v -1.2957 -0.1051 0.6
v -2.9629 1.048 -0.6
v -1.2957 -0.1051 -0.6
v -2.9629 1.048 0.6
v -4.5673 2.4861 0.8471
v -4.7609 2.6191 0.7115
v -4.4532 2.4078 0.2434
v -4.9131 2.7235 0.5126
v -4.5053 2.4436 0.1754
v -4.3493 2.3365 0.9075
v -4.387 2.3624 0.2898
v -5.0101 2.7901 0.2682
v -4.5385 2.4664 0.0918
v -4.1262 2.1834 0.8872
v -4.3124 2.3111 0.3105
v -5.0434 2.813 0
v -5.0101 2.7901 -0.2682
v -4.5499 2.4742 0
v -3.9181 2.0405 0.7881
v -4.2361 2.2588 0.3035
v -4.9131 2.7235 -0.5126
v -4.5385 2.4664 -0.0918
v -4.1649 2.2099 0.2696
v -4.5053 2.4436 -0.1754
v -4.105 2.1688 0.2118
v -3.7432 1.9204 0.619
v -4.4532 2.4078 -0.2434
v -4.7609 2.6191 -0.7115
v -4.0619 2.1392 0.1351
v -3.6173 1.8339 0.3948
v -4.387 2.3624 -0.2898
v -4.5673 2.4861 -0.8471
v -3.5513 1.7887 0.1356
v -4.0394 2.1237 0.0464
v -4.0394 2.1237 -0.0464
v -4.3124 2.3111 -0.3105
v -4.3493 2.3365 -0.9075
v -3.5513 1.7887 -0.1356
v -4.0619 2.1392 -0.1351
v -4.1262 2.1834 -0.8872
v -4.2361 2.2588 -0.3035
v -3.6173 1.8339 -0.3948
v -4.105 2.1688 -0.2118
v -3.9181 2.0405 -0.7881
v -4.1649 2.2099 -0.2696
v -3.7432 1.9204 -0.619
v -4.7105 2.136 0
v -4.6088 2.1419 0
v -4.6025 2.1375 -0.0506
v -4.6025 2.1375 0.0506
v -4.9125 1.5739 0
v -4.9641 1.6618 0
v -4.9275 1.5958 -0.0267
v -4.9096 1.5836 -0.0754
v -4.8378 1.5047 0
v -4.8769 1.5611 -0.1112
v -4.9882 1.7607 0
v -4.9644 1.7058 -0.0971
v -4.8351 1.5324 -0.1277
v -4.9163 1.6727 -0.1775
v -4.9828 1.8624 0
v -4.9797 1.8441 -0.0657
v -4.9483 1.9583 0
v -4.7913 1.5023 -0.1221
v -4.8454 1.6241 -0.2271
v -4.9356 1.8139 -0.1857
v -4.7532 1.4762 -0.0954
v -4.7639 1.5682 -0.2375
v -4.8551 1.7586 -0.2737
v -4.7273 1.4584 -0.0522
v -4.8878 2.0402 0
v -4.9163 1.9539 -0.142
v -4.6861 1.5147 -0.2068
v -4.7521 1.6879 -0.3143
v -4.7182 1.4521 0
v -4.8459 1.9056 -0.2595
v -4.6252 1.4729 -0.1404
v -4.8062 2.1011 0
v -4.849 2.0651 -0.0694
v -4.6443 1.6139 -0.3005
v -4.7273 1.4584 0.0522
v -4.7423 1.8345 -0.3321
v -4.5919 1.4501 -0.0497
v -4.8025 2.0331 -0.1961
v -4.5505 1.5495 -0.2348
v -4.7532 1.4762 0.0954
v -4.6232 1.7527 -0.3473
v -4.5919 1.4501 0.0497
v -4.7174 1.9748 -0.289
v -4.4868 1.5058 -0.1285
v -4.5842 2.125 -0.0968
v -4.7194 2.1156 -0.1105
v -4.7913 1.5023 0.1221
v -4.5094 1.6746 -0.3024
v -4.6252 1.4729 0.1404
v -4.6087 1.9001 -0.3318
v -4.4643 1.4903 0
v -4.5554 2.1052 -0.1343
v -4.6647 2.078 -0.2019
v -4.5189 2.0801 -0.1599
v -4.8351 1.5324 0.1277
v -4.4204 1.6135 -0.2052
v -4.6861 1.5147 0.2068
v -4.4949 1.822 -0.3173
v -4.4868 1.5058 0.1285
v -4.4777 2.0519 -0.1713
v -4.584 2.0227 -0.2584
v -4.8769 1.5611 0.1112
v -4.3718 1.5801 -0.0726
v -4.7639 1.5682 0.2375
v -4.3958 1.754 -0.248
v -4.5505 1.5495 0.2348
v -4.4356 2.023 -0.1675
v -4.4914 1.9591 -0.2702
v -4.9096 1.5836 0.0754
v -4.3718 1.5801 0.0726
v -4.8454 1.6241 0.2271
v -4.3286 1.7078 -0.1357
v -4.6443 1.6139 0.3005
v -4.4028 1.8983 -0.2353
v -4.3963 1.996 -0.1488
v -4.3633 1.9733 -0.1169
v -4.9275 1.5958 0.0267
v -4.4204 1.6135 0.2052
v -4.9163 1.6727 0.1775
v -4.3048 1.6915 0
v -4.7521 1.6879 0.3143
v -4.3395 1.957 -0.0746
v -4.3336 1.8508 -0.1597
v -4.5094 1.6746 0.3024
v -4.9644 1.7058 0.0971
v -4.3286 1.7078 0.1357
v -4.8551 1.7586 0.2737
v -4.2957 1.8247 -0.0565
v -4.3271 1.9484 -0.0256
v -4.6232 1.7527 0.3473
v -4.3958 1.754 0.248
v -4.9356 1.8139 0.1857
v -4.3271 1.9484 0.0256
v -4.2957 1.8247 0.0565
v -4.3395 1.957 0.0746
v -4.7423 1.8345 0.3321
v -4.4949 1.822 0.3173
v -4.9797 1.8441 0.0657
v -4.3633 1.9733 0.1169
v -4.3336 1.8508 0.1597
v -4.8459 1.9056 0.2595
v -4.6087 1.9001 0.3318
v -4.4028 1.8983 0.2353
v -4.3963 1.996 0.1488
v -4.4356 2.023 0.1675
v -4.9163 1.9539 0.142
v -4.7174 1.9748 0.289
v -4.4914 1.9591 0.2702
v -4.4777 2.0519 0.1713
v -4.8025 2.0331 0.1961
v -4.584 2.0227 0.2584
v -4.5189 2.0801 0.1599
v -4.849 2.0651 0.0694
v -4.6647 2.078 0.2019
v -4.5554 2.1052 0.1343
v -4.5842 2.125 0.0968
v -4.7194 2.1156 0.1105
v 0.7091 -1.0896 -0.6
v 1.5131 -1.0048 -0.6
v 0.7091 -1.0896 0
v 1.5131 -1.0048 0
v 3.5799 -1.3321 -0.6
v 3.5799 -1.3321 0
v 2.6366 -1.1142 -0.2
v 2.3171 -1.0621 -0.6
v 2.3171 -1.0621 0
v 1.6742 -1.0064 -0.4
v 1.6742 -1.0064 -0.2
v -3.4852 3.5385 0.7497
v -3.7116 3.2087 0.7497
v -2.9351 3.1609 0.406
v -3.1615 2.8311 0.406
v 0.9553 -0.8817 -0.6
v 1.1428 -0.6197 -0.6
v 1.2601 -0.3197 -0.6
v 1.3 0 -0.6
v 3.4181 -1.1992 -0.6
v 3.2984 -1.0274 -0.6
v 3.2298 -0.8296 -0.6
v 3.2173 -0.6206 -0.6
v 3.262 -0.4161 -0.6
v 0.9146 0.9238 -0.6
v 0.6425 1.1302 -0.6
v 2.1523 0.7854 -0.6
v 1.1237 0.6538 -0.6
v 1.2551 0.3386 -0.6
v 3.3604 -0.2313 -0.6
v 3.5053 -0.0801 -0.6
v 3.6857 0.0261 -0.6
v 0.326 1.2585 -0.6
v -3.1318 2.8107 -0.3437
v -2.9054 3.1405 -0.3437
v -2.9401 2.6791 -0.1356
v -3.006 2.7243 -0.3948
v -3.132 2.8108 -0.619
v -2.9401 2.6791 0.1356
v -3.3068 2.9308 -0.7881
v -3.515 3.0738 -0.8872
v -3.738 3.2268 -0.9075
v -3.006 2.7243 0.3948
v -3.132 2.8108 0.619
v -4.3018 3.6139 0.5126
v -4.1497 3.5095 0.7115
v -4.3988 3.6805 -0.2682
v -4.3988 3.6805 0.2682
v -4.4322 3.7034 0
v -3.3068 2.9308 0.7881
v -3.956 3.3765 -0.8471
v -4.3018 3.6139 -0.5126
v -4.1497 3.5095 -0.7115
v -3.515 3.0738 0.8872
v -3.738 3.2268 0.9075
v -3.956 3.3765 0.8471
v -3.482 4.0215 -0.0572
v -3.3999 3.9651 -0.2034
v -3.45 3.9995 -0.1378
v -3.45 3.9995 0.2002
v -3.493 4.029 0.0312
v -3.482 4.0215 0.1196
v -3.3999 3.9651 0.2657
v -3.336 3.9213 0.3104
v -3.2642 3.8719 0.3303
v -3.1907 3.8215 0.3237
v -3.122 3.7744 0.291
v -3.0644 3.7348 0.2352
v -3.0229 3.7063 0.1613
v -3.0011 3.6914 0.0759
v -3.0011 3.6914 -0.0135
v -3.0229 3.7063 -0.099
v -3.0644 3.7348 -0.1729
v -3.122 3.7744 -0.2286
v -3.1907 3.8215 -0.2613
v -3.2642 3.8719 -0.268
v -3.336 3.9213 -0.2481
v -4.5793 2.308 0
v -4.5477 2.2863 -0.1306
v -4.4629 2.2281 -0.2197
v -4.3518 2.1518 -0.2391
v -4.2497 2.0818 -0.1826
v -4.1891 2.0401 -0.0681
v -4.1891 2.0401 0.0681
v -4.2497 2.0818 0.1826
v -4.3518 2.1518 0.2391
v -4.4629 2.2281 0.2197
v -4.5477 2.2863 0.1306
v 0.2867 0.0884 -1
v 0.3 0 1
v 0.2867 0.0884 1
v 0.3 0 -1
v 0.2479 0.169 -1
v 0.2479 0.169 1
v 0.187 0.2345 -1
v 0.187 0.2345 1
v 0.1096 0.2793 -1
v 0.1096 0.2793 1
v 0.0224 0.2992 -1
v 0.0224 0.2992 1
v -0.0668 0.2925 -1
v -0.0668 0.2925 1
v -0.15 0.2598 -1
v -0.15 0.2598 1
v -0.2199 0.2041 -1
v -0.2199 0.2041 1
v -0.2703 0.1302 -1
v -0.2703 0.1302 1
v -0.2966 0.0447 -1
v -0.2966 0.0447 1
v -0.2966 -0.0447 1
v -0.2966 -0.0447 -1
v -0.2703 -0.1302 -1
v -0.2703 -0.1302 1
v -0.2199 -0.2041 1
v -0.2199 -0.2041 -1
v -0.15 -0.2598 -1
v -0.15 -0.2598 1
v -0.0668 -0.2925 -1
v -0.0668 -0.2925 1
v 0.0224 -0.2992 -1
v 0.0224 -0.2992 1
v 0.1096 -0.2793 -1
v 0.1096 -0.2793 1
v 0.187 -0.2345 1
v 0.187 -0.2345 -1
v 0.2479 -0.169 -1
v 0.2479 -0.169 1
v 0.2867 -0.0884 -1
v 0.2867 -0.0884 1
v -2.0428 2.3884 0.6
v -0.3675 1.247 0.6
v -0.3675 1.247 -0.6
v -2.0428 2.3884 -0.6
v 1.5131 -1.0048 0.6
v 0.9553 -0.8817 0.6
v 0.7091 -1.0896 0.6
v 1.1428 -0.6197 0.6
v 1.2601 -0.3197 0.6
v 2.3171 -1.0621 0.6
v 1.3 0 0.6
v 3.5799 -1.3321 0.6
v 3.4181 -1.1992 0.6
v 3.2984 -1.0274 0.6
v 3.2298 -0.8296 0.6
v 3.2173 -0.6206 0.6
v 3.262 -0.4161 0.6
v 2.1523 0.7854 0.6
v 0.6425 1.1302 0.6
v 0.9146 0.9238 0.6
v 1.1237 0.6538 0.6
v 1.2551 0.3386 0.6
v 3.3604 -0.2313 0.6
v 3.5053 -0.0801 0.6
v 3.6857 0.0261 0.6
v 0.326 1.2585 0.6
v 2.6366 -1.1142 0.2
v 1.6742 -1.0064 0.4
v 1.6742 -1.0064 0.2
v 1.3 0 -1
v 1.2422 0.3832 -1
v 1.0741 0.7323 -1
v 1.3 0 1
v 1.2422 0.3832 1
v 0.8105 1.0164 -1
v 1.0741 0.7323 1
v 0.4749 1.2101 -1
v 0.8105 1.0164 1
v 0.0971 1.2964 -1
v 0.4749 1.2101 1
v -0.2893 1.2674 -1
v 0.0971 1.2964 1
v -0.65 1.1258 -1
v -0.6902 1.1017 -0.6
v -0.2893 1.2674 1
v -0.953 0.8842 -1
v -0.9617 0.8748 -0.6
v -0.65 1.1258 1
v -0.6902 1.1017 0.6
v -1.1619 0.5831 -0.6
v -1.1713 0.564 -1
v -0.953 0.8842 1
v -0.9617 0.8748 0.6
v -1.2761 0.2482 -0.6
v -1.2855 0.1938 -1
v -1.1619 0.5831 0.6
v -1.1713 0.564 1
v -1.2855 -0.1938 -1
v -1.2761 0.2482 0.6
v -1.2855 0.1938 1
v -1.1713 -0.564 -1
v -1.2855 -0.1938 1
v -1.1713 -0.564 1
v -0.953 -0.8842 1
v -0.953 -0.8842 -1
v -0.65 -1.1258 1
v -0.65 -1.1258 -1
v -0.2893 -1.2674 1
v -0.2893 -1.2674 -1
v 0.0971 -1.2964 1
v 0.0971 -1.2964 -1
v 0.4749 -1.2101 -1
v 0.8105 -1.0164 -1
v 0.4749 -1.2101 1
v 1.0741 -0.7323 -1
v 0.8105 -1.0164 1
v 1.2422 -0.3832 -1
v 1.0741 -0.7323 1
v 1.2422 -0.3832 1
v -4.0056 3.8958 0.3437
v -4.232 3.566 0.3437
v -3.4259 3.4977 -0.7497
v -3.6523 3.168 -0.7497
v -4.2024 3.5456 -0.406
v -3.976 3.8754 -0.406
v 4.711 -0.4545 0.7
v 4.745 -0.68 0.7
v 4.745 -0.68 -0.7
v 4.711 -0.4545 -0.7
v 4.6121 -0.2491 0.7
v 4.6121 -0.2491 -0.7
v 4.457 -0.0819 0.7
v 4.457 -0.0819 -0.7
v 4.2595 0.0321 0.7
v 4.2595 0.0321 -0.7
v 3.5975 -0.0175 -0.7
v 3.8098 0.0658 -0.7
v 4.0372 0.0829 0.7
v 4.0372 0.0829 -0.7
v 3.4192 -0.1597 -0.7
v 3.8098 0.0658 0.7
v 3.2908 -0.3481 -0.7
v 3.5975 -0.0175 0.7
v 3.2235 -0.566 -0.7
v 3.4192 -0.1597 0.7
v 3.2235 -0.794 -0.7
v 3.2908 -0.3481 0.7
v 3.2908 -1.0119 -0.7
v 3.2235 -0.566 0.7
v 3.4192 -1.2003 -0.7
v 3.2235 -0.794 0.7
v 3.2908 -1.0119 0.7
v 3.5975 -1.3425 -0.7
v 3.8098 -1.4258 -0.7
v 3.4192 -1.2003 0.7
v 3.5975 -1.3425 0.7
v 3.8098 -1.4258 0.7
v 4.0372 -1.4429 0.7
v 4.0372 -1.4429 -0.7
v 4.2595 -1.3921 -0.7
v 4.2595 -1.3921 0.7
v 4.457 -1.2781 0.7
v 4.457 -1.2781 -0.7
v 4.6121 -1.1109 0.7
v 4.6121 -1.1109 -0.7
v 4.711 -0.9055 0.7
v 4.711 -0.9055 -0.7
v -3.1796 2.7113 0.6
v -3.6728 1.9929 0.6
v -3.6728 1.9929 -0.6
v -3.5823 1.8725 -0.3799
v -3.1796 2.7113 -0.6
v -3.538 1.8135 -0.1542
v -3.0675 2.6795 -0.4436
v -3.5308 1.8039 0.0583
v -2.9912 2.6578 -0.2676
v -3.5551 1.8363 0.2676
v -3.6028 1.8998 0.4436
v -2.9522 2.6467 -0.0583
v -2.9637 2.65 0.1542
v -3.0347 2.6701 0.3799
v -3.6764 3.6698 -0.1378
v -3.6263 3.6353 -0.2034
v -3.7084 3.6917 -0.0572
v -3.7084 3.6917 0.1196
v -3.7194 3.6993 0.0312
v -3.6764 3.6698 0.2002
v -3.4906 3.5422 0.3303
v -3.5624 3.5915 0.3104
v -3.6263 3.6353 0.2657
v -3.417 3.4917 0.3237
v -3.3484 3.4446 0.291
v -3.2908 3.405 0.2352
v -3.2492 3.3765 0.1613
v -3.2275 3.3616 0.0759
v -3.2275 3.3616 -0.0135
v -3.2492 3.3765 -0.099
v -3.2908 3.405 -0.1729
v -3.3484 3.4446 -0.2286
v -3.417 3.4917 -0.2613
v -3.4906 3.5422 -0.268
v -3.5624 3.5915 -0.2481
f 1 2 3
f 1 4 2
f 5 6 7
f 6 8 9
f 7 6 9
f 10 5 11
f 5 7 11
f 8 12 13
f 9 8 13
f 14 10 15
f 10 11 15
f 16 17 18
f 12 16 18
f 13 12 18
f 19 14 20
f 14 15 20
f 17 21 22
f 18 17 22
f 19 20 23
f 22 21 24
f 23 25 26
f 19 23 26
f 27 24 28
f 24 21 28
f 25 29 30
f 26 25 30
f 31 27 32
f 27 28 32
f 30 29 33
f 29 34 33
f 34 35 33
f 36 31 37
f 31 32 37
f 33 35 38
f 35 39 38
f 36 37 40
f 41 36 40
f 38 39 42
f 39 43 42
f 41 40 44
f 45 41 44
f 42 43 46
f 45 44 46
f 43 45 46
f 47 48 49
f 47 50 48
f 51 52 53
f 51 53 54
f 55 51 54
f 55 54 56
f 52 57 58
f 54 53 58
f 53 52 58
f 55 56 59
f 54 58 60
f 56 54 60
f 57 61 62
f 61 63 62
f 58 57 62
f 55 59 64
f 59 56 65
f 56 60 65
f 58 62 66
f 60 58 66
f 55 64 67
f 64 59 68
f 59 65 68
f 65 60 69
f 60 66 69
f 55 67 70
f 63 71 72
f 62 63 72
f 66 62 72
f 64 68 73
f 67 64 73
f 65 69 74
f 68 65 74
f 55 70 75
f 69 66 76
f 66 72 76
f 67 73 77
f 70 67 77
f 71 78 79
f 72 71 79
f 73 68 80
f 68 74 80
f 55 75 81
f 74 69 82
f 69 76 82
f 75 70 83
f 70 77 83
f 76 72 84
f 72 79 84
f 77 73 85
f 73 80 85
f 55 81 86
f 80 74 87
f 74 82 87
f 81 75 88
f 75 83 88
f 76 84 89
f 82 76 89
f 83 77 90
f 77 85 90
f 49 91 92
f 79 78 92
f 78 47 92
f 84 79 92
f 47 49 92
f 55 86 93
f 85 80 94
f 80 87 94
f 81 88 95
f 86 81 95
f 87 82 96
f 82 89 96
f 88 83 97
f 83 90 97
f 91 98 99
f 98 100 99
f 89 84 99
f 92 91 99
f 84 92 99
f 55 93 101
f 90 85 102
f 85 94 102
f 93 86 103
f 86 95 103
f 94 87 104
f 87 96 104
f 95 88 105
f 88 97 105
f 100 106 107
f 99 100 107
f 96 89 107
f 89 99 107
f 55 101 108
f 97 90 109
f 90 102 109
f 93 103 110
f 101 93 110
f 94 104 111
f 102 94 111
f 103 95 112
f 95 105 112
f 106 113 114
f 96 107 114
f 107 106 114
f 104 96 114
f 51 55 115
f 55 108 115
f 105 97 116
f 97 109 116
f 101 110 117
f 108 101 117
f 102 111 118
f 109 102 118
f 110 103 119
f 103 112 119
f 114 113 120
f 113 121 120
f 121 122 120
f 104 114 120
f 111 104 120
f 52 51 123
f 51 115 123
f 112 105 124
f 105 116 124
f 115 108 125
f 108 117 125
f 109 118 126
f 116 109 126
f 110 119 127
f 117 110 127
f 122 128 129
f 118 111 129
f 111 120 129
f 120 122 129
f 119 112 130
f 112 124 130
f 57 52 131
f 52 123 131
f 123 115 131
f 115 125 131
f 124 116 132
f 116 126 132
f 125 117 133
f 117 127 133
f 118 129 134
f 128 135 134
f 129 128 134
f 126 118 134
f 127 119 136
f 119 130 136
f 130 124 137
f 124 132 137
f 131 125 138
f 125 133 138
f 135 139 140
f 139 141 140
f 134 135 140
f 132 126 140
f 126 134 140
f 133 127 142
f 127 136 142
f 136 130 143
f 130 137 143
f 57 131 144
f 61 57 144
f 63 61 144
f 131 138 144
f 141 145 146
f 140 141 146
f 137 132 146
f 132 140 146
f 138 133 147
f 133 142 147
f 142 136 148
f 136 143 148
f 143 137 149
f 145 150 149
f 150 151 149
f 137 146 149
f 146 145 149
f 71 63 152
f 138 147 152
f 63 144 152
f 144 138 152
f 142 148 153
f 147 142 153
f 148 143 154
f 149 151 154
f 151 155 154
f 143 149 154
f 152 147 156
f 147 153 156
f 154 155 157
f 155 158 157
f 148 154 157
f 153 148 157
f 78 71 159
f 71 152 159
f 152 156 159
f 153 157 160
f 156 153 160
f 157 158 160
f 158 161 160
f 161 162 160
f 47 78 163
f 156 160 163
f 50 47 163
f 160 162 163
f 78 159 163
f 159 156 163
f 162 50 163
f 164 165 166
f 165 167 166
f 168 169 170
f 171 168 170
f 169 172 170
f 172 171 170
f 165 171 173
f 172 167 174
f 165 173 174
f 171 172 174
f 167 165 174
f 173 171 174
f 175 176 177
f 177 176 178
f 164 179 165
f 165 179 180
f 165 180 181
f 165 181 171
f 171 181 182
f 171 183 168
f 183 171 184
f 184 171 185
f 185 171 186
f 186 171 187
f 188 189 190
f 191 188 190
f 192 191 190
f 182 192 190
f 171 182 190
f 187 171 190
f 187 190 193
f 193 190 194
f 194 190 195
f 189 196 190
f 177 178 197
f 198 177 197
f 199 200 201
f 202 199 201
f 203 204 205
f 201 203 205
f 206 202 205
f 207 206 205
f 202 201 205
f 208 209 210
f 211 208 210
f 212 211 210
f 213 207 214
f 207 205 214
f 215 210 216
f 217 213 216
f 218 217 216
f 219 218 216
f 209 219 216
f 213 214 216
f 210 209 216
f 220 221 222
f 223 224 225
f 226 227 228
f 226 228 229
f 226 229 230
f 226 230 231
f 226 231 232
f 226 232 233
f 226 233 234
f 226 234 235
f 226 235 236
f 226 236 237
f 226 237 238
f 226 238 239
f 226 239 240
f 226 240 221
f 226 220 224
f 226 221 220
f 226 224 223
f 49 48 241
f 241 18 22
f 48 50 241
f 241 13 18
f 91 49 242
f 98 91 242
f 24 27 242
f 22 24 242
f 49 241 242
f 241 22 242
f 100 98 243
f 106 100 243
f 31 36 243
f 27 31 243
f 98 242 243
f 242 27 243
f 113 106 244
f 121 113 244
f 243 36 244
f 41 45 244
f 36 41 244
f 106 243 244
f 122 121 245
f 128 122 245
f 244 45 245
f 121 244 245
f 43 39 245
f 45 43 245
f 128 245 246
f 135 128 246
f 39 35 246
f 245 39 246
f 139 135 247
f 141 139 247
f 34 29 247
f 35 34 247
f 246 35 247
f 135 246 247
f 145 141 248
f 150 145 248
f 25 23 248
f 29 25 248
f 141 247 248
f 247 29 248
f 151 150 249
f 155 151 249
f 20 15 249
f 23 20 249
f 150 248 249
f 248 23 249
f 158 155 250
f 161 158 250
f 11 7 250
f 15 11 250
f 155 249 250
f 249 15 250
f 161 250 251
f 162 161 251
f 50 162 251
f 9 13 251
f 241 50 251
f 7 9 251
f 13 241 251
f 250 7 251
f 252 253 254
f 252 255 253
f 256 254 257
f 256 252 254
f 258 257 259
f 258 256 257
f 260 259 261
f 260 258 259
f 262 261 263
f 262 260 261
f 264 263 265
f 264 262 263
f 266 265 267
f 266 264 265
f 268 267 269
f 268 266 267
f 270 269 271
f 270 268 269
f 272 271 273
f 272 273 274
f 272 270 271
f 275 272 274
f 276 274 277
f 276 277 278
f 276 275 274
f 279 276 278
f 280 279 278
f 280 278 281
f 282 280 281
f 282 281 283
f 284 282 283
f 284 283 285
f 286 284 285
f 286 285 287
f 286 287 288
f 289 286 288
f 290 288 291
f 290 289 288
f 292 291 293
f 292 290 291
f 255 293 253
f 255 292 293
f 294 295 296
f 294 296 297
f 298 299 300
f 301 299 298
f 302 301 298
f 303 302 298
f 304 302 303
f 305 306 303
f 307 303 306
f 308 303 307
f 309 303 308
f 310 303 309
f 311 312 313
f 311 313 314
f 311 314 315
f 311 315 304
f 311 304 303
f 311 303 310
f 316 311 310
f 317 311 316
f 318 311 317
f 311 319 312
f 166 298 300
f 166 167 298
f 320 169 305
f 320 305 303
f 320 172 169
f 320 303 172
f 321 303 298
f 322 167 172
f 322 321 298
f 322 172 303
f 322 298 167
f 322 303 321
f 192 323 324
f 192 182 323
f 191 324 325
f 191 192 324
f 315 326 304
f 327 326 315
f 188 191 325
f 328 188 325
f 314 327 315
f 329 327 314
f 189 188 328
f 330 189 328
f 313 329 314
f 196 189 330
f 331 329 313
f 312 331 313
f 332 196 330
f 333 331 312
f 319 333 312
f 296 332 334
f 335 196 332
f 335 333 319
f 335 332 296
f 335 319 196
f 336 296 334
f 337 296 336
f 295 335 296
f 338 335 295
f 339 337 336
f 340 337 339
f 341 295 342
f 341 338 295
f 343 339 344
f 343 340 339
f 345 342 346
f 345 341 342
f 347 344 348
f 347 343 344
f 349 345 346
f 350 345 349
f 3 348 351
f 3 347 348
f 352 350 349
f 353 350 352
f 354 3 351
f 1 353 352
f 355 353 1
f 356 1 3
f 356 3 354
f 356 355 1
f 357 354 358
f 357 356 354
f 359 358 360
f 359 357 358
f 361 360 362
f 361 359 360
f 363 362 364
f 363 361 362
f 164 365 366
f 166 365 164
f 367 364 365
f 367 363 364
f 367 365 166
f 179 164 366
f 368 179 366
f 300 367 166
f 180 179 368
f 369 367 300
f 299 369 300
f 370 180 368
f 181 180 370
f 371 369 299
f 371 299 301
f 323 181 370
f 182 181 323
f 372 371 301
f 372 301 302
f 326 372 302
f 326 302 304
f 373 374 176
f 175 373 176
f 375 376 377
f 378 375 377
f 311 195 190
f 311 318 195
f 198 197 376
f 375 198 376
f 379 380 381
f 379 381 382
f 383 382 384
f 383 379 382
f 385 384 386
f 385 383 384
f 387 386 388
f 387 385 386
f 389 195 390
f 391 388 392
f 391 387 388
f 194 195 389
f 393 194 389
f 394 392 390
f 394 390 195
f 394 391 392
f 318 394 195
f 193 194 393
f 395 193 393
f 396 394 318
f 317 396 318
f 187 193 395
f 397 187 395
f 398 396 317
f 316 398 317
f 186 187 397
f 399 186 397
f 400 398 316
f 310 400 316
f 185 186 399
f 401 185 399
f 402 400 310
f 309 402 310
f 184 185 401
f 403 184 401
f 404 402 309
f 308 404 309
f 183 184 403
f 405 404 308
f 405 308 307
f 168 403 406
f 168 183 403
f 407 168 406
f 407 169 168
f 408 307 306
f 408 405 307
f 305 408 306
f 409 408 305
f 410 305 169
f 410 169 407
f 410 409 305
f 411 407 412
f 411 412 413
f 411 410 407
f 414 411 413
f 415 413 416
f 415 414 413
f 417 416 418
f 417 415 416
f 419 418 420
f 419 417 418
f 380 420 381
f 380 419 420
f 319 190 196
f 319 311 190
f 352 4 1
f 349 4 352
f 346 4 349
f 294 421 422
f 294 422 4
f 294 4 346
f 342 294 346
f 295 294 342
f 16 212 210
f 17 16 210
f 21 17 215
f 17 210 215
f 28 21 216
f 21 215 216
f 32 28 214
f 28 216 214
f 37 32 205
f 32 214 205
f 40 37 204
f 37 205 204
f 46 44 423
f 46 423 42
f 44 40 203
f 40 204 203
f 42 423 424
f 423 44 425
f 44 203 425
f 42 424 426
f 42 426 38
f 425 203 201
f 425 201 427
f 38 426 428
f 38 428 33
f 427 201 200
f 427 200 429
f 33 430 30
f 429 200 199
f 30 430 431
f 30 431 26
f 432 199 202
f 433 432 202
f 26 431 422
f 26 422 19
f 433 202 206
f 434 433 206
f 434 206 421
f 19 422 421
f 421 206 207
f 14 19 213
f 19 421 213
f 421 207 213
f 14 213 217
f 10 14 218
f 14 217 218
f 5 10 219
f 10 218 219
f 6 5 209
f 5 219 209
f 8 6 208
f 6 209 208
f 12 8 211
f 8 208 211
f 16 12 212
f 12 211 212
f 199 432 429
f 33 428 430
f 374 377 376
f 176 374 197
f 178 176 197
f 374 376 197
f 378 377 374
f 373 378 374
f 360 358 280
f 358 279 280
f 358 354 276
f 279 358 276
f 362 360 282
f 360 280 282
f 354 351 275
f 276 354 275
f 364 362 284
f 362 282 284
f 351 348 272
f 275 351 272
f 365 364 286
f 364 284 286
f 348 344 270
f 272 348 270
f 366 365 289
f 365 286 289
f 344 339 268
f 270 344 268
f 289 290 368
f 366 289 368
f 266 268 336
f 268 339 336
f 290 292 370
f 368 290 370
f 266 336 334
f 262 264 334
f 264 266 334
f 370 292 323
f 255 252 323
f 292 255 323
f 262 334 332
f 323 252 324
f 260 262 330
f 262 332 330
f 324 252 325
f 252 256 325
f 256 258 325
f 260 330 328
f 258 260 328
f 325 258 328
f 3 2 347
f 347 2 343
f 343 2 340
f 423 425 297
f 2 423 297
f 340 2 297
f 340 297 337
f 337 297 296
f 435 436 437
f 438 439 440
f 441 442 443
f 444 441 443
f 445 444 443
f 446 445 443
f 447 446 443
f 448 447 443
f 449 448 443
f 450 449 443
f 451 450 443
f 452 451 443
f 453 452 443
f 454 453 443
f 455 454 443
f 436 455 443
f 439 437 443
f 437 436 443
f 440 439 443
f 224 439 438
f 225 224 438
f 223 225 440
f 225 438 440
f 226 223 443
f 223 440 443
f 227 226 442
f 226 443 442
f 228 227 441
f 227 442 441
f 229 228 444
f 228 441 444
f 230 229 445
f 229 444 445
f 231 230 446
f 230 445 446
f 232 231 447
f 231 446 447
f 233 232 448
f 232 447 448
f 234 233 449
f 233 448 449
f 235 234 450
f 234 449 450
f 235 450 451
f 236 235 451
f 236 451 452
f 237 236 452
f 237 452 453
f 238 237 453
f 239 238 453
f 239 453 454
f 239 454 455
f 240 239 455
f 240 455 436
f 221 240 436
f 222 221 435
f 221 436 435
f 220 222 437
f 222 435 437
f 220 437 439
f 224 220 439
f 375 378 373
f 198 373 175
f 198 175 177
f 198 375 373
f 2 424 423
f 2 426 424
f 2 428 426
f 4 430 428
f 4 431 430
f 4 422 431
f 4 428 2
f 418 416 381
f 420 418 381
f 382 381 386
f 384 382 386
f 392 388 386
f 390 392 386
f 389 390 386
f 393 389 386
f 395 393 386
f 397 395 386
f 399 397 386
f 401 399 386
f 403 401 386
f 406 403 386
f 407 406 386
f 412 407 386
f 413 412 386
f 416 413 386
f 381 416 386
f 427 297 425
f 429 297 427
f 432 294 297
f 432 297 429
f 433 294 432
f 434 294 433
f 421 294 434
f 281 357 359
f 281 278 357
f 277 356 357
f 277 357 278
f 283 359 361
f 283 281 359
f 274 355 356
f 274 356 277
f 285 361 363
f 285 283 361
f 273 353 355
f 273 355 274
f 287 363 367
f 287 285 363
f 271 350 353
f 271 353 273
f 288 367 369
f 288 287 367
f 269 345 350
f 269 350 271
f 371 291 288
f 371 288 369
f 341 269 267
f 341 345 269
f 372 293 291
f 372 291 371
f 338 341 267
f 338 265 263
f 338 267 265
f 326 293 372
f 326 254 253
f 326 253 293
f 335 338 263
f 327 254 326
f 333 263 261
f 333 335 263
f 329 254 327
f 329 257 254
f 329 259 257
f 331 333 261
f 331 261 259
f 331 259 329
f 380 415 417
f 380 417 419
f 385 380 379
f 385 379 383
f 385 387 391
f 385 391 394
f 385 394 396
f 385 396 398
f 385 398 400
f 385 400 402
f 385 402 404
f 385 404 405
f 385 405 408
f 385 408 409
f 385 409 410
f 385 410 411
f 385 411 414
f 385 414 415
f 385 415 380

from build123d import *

# Parameters (mm, degrees)
SKETCH1_R           = 0.3
BOSS_EXTRUDE1_DEPTH = 1
BOSS_EXTRUDE2_DEPTH = 0.7
BOSS_EXTRUDE3_DEPTH = 0.6
BOSS_EXTRUDE4_DEPTH = 0.6
BOSS_EXTRUDE5_DEPTH = 0.4
SKETCH5_R           = 0.3
BOSS_EXTRUDE6_DEPTH = 0.4


with BuildPart() as part:
    # Sketch1 → Boss-Extrude1 (new, symmetric)
    with BuildSketch(Plane.XY):
        with BuildLine():
            ThreePointArc((1.3, 0), (1.02804324, 0.795692841), (0.325958313, 1.258471763))
            ThreePointArc((0.325958313, 1.258471763), (-0.021576108, 1.299820938), (-0.36754671, 1.24696007))
            ThreePointArc((-0.36754671, 1.24696007), (-1.071749439, 0.735767042), (-1.295745132, -0.105093068))
            ThreePointArc((-1.295745132, -0.105093068), (-0.573001329, -1.166905942), (0.709115587, -1.089566466))
            ThreePointArc((0.709115587, -1.089566466), (1.142770813, -0.619737742), (1.3, 0))
        make_face()
        Circle(SKETCH1_R, mode=Mode.SUBTRACT)
    extrude(amount=BOSS_EXTRUDE1_DEPTH, both=True)



with BuildPart() as body_2:
    # Sketch1<3> → Boss-Extrude2 (new, symmetric)
    with BuildSketch(Plane.XY):
        with BuildLine():
            ThreePointArc((4.745, -0.68), (4.404295551, -0.043448128), (3.685658077, 0.026107522))
            ThreePointArc((3.685658077, 0.026107522), (3.217306903, -0.620634696), (3.579943327, -1.332058018))
            ThreePointArc((3.579943327, -1.332058018), (4.353618552, -1.34755837), (4.745, -0.68))
        make_face()
    extrude(amount=BOSS_EXTRUDE2_DEPTH, both=True)


with BuildPart() as part_1:
    add(part.part)

    add(body_2.part)  # Boss-Extrude3 merges body 2
    # Sketch1<4> → Boss-Extrude3 (add, symmetric)
    with BuildSketch(Plane.XY):
        with BuildLine():
            Line((2.152301429, 0.785428395), (0.325958313, 1.258471763))
            ThreePointArc((0.325958313, 1.258471763), (1.02804324, 0.795692841), (1.3, 0))
            ThreePointArc((1.3, 0), (1.142770813, -0.619737742), (0.709115587, -1.089566466))
            add(Edge.make_bspline(
                [(3.579943327, -1.332058018), (2.651549226, -1.086241339), (1.670075627, -0.883873745), (0.709115587, -1.089566466)],
                knots=[0, 0, 0, 0, 1, 1, 1, 1], degree=3))
            ThreePointArc((3.579943327, -1.332058018), (3.217306903, -0.620634696), (3.685658077, 0.026107522))
            Line((3.685658077, 0.026107522), (2.152301429, 0.785428395))
        make_face()
    extrude(amount=BOSS_EXTRUDE3_DEPTH, both=True)

    # Sketch1<5> → Boss-Extrude4 (add, symmetric)
    with BuildSketch(Plane.XY):
        with BuildLine():
            ThreePointArc((-1.295745132, -0.105093068), (-1.071749439, 0.735767042), (-0.36754671, 1.24696007))
            Line((-0.36754671, 1.24696007), (-2.042763802, 2.388420801))
            Line((-2.042763802, 2.388420801), (-3.468005165, 2.793231136))
            Line((-3.468005165, 2.793231136), (-3.852867925, 2.232623737))
            Line((-3.852867925, 2.232623737), (-2.962943123, 1.048048625))
            Line((-2.962943123, 1.048048625), (-1.295745132, -0.105093068))
        make_face()
    extrude(amount=BOSS_EXTRUDE4_DEPTH, both=True)



with BuildPart() as body_2_2:
    # Sketch2 → Revolve1 (revolve)
    with BuildSketch(Plane.XY):
        with BuildLine():
            Line((-3.852867925, 2.232623737), (-3.445366179, 2.826208042))
            Line((-3.445366179, 2.826208042), (-3.775135237, 3.052597901))
            Line((-3.775135237, 3.052597901), (-4.837794635, 1.50468321))
            ThreePointArc((-4.837794635, 1.50468321), (-4.410872151, 1.528398717), (-4.325469227, 1.947363599))
            Line((-4.325469227, 1.947363599), (-3.852867925, 2.232623737))
        make_face()
    revolve(axis=Axis((-3.775135237, 3.052597901, 0), (-0.5659746478395021, -0.8244226452511791, 0)))


with BuildPart() as part_2:
    add(part_1.part)

    add(body_2_2.part)  # Revolve2 merges body 2 2
    # Sketch3 → Revolve2 (revolve)
    with BuildSketch(Plane.XY):
        Polygon((-3.681934751, 3.188357677), (-4.29318737, 2.29798122), (-5.043411978, 2.813018149), (-4.432159358, 3.703394606), align=None)
    revolve(axis=Axis((-3.681934751, 3.188357677, 0), (-0.5659746478395028, -0.8244226452511788, 0)))


with BuildPart() as body_2_3:
    # Sketch4 → Boss-Extrude5 (new body)
    with BuildSketch(Plane(origin=(0.308270852, 0.449040381, 0), x_dir=(0.8244226452511786, -0.5659746478395029, 0), z_dir=(0.5659746478395029, 0.8244226452511786, 0))):
        Polygon((-4.208750665, -0.406026614), (-4.172745971, 0.343664653), (-4.803995305, 0.749691267), (-5.471249335, 0.406026614), (-5.507254029, -0.343664653), (-4.876004695, -0.749691267), align=None)
    extrude(amount=BOSS_EXTRUDE5_DEPTH)


with BuildPart() as body_3:
    # Sketch5 → Boss-Extrude6 (new body)
    with BuildSketch(Plane(origin=(0.534660711, 0.778809439, 0), x_dir=(0.8244226452511789, -0.5659746478395026, 0), z_dir=(0.5659746478395025, 0.8244226452511788, 0))):
        with Locations((-4.860055954, -0.03118098)):
            Circle(SKETCH5_R)
    extrude(amount=BOSS_EXTRUDE6_DEPTH)


solid = Compound([part_2.part, body_2_3.part, body_3.part])
